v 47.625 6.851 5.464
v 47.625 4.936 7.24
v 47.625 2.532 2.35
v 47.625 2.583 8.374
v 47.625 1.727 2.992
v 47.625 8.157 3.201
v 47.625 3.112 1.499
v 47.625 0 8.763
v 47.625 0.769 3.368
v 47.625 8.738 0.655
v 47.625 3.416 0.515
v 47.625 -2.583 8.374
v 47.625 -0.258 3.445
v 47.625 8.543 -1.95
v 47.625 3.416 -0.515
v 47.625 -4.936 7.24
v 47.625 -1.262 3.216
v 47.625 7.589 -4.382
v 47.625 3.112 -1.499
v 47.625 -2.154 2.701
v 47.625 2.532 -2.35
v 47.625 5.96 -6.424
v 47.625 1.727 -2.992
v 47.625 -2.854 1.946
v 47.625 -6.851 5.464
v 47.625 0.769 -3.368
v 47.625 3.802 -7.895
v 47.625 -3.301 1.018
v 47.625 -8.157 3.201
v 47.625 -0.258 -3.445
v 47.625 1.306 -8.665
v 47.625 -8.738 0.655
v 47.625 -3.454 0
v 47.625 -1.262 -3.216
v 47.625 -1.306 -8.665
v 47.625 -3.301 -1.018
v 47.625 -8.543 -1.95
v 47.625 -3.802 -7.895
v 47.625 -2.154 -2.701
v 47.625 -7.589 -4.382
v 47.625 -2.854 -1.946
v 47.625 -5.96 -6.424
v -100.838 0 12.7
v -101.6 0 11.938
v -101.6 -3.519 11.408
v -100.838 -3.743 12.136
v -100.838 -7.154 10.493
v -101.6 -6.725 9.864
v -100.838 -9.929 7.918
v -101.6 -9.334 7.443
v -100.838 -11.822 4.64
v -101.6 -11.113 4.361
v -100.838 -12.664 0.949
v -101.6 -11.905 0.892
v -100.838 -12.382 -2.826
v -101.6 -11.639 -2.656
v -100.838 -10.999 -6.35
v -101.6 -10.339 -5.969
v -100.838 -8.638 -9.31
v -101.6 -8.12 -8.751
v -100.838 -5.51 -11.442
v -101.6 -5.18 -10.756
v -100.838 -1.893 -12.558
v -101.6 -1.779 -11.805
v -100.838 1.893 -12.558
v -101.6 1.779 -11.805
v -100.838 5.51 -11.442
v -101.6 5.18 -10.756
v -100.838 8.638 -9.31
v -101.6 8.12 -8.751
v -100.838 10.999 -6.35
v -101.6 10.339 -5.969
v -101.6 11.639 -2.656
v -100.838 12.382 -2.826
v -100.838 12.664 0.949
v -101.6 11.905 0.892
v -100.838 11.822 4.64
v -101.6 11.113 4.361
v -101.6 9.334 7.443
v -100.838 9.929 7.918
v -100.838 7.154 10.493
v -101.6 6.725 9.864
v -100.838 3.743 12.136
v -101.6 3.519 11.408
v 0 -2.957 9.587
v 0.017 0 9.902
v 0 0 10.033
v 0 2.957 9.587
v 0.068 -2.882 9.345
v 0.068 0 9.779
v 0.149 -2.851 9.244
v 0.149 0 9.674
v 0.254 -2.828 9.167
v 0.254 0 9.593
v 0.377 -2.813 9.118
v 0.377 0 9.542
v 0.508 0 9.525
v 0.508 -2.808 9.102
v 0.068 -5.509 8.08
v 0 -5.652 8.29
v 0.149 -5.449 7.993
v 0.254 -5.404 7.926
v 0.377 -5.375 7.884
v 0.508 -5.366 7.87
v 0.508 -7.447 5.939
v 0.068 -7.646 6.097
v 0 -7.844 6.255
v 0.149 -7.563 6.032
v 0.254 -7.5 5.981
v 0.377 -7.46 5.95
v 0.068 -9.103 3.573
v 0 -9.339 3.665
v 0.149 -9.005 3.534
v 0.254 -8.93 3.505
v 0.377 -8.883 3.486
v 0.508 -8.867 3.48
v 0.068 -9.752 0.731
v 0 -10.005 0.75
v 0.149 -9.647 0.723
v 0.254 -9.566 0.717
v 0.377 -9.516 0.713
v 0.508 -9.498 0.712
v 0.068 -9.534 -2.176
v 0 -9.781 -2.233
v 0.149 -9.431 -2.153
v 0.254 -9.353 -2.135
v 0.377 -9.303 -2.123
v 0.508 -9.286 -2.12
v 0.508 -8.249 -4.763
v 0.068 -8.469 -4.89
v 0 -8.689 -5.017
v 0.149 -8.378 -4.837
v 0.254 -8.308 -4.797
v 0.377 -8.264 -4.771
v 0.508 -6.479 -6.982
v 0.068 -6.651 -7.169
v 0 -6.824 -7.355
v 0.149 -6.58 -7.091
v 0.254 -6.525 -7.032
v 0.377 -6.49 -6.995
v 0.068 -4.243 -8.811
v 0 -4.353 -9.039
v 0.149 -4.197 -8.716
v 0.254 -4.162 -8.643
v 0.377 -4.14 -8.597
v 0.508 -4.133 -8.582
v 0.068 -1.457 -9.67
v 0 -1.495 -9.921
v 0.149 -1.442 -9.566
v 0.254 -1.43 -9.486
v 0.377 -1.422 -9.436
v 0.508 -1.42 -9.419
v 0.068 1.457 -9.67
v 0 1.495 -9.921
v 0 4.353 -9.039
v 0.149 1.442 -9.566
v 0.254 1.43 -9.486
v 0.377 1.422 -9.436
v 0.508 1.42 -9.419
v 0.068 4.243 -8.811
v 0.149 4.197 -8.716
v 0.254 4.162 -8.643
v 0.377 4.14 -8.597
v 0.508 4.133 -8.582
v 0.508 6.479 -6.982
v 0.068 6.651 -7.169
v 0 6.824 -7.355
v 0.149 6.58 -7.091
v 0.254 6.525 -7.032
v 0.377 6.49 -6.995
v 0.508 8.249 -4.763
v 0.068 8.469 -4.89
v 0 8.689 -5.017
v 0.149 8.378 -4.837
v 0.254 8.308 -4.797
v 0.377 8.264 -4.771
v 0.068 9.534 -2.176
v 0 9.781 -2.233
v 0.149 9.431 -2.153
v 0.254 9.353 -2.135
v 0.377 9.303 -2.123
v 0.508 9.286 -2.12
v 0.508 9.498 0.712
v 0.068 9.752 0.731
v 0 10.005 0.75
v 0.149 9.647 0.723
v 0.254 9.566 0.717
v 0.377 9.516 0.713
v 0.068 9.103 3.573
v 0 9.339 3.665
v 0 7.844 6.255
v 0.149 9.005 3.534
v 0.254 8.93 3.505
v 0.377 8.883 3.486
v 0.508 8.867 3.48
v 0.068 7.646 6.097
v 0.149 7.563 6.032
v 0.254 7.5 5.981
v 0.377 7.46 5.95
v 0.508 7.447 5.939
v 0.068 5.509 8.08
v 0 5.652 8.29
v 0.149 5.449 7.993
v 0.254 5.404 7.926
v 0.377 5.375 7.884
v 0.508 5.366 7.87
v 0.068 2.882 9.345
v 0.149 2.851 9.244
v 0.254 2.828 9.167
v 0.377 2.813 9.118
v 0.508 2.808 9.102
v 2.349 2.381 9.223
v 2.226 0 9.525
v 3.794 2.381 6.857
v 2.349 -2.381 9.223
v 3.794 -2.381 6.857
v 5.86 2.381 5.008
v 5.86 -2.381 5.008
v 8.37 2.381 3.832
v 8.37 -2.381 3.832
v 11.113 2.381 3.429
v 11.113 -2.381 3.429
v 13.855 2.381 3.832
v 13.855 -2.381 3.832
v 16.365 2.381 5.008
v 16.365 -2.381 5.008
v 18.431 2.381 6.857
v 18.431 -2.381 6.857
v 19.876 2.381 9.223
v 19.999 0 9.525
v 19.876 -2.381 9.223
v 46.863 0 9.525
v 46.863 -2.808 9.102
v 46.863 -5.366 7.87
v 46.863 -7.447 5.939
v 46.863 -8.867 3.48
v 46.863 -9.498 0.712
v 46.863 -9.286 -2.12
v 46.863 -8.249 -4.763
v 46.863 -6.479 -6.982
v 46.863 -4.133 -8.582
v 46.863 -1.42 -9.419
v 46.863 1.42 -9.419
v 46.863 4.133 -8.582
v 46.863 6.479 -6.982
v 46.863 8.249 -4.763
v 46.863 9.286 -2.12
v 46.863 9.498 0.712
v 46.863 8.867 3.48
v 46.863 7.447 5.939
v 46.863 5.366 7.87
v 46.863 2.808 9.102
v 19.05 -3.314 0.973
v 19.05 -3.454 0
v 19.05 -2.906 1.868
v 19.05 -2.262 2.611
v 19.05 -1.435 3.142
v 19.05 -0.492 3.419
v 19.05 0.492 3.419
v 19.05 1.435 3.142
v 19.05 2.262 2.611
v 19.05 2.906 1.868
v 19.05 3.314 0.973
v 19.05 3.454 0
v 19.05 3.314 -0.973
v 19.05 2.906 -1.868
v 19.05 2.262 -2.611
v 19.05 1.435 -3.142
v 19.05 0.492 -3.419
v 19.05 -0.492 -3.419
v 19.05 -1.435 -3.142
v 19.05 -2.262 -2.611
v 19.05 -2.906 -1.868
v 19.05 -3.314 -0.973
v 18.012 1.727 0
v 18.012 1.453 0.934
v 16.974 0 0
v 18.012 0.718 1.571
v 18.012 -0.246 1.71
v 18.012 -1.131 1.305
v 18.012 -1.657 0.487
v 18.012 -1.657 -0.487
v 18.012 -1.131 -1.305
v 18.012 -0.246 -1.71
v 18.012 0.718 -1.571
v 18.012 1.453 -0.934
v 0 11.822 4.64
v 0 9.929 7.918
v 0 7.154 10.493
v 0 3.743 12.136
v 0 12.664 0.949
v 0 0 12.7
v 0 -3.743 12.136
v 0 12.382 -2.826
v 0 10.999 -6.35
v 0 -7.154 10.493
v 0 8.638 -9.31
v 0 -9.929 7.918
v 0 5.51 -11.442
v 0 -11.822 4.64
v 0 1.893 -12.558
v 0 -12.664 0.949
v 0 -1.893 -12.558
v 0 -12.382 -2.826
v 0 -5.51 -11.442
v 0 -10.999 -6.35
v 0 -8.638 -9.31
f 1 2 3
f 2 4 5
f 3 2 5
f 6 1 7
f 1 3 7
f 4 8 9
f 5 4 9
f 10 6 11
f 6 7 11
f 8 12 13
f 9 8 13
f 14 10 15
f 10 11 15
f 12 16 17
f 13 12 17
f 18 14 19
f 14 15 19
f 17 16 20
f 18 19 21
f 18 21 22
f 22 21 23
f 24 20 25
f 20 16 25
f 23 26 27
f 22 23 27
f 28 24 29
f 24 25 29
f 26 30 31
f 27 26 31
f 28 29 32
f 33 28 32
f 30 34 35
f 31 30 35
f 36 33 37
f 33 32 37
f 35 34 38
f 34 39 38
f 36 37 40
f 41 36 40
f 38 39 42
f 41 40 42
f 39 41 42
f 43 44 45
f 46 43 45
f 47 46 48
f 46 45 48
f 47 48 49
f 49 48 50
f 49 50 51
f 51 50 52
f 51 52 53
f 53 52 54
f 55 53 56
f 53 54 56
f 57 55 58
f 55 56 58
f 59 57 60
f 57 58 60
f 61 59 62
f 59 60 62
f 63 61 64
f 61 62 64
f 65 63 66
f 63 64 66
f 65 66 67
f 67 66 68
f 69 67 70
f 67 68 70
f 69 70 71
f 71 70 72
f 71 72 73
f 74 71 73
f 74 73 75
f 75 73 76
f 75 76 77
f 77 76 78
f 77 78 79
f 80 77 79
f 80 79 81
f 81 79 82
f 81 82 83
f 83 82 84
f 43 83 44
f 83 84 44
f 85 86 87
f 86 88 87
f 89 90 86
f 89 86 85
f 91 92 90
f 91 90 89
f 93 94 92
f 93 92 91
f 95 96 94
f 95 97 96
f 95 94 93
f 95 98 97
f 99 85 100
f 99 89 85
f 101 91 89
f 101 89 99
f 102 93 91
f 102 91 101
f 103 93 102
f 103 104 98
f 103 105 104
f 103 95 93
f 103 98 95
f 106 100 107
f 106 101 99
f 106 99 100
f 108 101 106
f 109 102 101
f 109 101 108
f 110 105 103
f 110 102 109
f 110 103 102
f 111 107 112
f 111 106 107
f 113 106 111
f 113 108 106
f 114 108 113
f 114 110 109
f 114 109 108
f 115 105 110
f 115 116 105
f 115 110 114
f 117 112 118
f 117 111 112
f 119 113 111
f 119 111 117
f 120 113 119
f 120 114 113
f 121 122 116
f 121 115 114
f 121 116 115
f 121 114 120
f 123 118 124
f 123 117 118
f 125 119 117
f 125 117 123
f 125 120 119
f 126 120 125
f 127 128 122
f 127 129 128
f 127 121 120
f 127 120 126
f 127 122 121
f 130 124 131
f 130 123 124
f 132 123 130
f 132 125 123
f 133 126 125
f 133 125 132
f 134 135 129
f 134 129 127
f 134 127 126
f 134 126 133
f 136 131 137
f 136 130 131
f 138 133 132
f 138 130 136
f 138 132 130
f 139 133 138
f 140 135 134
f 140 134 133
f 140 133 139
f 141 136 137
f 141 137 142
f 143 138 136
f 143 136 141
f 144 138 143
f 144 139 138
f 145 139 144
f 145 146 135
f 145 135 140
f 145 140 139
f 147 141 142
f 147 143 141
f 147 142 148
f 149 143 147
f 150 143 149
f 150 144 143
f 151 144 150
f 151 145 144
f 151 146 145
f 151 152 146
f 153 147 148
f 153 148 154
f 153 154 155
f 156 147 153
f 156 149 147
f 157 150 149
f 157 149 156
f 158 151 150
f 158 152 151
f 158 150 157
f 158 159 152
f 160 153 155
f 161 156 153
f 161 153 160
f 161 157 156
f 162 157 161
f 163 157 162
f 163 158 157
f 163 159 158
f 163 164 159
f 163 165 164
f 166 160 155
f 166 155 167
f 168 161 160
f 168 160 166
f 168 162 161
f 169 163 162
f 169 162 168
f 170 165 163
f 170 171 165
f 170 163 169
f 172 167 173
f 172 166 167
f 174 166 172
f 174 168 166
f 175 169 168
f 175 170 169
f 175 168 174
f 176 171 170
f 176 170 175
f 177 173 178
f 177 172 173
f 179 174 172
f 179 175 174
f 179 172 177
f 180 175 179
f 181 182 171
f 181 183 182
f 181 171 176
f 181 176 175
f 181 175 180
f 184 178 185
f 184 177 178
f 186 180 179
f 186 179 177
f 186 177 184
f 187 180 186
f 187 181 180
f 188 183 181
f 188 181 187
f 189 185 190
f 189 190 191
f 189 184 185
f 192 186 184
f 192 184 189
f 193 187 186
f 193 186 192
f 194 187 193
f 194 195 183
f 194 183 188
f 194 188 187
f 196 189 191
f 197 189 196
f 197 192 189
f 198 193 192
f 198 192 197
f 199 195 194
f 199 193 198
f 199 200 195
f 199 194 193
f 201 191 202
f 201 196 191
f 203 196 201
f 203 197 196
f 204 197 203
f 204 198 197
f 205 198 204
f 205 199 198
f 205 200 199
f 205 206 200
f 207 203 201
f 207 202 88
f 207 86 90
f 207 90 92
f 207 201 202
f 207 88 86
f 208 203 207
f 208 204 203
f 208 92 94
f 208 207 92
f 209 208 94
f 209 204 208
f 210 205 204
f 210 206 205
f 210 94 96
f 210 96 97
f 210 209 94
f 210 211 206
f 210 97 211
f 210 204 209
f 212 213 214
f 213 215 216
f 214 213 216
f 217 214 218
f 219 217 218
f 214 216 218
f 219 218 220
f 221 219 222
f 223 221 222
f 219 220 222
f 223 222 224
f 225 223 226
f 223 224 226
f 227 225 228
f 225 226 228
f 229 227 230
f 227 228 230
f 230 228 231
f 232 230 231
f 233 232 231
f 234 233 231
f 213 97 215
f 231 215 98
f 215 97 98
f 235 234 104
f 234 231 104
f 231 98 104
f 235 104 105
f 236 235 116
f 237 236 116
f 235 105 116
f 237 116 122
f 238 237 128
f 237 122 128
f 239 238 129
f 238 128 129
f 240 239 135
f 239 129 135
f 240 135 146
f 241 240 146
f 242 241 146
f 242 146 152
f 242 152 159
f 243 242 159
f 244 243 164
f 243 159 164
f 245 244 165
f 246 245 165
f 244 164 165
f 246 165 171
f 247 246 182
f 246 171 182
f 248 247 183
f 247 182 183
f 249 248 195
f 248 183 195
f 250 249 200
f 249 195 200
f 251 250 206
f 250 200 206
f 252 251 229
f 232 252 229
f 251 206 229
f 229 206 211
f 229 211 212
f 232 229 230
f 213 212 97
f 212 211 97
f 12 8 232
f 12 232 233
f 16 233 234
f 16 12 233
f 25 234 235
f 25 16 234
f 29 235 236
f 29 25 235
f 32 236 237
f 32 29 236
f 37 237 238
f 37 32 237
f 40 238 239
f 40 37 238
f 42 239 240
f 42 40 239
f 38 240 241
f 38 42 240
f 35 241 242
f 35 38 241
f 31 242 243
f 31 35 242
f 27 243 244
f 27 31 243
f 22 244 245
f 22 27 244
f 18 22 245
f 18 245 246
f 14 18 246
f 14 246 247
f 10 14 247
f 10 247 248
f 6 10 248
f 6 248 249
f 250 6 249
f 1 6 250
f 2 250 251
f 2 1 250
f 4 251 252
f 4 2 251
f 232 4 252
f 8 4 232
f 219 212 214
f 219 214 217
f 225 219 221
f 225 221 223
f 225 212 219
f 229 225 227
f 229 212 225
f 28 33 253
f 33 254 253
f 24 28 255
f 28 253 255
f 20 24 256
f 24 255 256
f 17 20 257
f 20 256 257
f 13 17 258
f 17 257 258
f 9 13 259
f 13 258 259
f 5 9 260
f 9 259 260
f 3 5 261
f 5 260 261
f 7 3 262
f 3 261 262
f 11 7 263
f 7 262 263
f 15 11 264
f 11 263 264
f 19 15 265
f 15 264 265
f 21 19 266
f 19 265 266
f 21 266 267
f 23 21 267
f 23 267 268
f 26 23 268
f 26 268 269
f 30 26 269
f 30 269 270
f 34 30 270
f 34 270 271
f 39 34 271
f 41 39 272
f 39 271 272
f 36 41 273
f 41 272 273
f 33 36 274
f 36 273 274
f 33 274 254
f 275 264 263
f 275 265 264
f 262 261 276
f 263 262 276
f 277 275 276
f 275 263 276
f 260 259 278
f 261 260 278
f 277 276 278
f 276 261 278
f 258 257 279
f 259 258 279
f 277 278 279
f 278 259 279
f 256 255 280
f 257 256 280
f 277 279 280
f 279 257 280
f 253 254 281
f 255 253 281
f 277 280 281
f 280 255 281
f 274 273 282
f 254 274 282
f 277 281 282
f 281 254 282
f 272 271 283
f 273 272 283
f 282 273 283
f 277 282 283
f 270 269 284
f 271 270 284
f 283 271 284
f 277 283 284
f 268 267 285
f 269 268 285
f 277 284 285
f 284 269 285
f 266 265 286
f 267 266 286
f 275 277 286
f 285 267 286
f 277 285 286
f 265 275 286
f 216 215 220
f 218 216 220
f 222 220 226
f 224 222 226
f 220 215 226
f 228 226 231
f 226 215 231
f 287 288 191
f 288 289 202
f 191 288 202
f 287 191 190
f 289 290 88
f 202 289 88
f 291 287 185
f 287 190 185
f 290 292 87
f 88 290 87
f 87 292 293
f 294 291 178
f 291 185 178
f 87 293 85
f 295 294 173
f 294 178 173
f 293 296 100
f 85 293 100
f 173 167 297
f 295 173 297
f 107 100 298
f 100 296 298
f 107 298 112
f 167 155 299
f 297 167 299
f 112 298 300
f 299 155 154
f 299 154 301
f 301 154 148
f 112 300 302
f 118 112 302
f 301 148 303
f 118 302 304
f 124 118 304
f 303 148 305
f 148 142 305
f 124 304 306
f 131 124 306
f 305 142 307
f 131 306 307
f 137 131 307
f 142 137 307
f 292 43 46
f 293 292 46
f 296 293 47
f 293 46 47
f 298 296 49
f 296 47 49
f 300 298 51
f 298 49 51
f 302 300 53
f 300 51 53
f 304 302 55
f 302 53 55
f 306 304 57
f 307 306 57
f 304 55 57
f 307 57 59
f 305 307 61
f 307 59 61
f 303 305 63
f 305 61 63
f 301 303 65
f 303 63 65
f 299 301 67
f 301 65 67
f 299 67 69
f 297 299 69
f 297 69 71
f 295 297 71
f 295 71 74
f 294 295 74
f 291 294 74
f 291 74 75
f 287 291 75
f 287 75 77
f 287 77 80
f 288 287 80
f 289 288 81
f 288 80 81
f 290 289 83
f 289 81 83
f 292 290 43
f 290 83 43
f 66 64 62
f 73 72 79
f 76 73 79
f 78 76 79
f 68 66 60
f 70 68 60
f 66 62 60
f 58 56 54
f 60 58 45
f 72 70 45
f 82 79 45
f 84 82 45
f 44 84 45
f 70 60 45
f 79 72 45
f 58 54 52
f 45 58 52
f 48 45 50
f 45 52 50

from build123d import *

# Parameters (mm, degrees)
F3_D     = 6.9088
F3_DEPTH = 28.575
F3_TIP   = 2.0756129224
F4_R     = 9.525
F5_DEPTH = 2.38125
F6_R     = 0.508
F7_SIZE  = 0.762


with BuildPart() as f1:
    # F0 (on Front) → F1 (revolve)
    with BuildSketch(Plane.XZ):
        Polygon((-101.6, 12.7), (-101.6, 0), (47.625, 0), (47.625, 9.525), (0, 9.525), (0, 12.7), align=None)
    revolve(axis=Axis((-26.9875, 0, 0), (1, 0, 0)))

    # F3
    with Locations(Plane.YZ.offset(47.625)):
        with Locations((0, 0)):
            Hole(F3_D / 2, depth=F3_DEPTH)
            with Locations((0, 0, -(F3_DEPTH + F3_TIP / 2))):  # 118° drill point
                Cone(0, F3_D / 2, F3_TIP, mode=Mode.SUBTRACT)

    # F4 (on Front) → F5 (cut, symmetric)
    with BuildSketch(Plane.XZ):
        with Locations((11.1125, 12.954)):
            Circle(F4_R)
    extrude(amount=F5_DEPTH, both=True, mode=Mode.SUBTRACT)

    # F6
    f6_edges = [f1.edges().sort_by_distance(p)[0] for p in [
        (0, 0, -9.525),
    ]]
    fillet(f6_edges, radius=F6_R)

    # F7
    f7_edges = [f1.edges().sort_by_distance(p)[0] for p in [
        (-101.6, 0, -12.7),
        (47.625, 0, -9.525),
    ]]
    chamfer(f7_edges, length=F7_SIZE)


solid = f1.part
